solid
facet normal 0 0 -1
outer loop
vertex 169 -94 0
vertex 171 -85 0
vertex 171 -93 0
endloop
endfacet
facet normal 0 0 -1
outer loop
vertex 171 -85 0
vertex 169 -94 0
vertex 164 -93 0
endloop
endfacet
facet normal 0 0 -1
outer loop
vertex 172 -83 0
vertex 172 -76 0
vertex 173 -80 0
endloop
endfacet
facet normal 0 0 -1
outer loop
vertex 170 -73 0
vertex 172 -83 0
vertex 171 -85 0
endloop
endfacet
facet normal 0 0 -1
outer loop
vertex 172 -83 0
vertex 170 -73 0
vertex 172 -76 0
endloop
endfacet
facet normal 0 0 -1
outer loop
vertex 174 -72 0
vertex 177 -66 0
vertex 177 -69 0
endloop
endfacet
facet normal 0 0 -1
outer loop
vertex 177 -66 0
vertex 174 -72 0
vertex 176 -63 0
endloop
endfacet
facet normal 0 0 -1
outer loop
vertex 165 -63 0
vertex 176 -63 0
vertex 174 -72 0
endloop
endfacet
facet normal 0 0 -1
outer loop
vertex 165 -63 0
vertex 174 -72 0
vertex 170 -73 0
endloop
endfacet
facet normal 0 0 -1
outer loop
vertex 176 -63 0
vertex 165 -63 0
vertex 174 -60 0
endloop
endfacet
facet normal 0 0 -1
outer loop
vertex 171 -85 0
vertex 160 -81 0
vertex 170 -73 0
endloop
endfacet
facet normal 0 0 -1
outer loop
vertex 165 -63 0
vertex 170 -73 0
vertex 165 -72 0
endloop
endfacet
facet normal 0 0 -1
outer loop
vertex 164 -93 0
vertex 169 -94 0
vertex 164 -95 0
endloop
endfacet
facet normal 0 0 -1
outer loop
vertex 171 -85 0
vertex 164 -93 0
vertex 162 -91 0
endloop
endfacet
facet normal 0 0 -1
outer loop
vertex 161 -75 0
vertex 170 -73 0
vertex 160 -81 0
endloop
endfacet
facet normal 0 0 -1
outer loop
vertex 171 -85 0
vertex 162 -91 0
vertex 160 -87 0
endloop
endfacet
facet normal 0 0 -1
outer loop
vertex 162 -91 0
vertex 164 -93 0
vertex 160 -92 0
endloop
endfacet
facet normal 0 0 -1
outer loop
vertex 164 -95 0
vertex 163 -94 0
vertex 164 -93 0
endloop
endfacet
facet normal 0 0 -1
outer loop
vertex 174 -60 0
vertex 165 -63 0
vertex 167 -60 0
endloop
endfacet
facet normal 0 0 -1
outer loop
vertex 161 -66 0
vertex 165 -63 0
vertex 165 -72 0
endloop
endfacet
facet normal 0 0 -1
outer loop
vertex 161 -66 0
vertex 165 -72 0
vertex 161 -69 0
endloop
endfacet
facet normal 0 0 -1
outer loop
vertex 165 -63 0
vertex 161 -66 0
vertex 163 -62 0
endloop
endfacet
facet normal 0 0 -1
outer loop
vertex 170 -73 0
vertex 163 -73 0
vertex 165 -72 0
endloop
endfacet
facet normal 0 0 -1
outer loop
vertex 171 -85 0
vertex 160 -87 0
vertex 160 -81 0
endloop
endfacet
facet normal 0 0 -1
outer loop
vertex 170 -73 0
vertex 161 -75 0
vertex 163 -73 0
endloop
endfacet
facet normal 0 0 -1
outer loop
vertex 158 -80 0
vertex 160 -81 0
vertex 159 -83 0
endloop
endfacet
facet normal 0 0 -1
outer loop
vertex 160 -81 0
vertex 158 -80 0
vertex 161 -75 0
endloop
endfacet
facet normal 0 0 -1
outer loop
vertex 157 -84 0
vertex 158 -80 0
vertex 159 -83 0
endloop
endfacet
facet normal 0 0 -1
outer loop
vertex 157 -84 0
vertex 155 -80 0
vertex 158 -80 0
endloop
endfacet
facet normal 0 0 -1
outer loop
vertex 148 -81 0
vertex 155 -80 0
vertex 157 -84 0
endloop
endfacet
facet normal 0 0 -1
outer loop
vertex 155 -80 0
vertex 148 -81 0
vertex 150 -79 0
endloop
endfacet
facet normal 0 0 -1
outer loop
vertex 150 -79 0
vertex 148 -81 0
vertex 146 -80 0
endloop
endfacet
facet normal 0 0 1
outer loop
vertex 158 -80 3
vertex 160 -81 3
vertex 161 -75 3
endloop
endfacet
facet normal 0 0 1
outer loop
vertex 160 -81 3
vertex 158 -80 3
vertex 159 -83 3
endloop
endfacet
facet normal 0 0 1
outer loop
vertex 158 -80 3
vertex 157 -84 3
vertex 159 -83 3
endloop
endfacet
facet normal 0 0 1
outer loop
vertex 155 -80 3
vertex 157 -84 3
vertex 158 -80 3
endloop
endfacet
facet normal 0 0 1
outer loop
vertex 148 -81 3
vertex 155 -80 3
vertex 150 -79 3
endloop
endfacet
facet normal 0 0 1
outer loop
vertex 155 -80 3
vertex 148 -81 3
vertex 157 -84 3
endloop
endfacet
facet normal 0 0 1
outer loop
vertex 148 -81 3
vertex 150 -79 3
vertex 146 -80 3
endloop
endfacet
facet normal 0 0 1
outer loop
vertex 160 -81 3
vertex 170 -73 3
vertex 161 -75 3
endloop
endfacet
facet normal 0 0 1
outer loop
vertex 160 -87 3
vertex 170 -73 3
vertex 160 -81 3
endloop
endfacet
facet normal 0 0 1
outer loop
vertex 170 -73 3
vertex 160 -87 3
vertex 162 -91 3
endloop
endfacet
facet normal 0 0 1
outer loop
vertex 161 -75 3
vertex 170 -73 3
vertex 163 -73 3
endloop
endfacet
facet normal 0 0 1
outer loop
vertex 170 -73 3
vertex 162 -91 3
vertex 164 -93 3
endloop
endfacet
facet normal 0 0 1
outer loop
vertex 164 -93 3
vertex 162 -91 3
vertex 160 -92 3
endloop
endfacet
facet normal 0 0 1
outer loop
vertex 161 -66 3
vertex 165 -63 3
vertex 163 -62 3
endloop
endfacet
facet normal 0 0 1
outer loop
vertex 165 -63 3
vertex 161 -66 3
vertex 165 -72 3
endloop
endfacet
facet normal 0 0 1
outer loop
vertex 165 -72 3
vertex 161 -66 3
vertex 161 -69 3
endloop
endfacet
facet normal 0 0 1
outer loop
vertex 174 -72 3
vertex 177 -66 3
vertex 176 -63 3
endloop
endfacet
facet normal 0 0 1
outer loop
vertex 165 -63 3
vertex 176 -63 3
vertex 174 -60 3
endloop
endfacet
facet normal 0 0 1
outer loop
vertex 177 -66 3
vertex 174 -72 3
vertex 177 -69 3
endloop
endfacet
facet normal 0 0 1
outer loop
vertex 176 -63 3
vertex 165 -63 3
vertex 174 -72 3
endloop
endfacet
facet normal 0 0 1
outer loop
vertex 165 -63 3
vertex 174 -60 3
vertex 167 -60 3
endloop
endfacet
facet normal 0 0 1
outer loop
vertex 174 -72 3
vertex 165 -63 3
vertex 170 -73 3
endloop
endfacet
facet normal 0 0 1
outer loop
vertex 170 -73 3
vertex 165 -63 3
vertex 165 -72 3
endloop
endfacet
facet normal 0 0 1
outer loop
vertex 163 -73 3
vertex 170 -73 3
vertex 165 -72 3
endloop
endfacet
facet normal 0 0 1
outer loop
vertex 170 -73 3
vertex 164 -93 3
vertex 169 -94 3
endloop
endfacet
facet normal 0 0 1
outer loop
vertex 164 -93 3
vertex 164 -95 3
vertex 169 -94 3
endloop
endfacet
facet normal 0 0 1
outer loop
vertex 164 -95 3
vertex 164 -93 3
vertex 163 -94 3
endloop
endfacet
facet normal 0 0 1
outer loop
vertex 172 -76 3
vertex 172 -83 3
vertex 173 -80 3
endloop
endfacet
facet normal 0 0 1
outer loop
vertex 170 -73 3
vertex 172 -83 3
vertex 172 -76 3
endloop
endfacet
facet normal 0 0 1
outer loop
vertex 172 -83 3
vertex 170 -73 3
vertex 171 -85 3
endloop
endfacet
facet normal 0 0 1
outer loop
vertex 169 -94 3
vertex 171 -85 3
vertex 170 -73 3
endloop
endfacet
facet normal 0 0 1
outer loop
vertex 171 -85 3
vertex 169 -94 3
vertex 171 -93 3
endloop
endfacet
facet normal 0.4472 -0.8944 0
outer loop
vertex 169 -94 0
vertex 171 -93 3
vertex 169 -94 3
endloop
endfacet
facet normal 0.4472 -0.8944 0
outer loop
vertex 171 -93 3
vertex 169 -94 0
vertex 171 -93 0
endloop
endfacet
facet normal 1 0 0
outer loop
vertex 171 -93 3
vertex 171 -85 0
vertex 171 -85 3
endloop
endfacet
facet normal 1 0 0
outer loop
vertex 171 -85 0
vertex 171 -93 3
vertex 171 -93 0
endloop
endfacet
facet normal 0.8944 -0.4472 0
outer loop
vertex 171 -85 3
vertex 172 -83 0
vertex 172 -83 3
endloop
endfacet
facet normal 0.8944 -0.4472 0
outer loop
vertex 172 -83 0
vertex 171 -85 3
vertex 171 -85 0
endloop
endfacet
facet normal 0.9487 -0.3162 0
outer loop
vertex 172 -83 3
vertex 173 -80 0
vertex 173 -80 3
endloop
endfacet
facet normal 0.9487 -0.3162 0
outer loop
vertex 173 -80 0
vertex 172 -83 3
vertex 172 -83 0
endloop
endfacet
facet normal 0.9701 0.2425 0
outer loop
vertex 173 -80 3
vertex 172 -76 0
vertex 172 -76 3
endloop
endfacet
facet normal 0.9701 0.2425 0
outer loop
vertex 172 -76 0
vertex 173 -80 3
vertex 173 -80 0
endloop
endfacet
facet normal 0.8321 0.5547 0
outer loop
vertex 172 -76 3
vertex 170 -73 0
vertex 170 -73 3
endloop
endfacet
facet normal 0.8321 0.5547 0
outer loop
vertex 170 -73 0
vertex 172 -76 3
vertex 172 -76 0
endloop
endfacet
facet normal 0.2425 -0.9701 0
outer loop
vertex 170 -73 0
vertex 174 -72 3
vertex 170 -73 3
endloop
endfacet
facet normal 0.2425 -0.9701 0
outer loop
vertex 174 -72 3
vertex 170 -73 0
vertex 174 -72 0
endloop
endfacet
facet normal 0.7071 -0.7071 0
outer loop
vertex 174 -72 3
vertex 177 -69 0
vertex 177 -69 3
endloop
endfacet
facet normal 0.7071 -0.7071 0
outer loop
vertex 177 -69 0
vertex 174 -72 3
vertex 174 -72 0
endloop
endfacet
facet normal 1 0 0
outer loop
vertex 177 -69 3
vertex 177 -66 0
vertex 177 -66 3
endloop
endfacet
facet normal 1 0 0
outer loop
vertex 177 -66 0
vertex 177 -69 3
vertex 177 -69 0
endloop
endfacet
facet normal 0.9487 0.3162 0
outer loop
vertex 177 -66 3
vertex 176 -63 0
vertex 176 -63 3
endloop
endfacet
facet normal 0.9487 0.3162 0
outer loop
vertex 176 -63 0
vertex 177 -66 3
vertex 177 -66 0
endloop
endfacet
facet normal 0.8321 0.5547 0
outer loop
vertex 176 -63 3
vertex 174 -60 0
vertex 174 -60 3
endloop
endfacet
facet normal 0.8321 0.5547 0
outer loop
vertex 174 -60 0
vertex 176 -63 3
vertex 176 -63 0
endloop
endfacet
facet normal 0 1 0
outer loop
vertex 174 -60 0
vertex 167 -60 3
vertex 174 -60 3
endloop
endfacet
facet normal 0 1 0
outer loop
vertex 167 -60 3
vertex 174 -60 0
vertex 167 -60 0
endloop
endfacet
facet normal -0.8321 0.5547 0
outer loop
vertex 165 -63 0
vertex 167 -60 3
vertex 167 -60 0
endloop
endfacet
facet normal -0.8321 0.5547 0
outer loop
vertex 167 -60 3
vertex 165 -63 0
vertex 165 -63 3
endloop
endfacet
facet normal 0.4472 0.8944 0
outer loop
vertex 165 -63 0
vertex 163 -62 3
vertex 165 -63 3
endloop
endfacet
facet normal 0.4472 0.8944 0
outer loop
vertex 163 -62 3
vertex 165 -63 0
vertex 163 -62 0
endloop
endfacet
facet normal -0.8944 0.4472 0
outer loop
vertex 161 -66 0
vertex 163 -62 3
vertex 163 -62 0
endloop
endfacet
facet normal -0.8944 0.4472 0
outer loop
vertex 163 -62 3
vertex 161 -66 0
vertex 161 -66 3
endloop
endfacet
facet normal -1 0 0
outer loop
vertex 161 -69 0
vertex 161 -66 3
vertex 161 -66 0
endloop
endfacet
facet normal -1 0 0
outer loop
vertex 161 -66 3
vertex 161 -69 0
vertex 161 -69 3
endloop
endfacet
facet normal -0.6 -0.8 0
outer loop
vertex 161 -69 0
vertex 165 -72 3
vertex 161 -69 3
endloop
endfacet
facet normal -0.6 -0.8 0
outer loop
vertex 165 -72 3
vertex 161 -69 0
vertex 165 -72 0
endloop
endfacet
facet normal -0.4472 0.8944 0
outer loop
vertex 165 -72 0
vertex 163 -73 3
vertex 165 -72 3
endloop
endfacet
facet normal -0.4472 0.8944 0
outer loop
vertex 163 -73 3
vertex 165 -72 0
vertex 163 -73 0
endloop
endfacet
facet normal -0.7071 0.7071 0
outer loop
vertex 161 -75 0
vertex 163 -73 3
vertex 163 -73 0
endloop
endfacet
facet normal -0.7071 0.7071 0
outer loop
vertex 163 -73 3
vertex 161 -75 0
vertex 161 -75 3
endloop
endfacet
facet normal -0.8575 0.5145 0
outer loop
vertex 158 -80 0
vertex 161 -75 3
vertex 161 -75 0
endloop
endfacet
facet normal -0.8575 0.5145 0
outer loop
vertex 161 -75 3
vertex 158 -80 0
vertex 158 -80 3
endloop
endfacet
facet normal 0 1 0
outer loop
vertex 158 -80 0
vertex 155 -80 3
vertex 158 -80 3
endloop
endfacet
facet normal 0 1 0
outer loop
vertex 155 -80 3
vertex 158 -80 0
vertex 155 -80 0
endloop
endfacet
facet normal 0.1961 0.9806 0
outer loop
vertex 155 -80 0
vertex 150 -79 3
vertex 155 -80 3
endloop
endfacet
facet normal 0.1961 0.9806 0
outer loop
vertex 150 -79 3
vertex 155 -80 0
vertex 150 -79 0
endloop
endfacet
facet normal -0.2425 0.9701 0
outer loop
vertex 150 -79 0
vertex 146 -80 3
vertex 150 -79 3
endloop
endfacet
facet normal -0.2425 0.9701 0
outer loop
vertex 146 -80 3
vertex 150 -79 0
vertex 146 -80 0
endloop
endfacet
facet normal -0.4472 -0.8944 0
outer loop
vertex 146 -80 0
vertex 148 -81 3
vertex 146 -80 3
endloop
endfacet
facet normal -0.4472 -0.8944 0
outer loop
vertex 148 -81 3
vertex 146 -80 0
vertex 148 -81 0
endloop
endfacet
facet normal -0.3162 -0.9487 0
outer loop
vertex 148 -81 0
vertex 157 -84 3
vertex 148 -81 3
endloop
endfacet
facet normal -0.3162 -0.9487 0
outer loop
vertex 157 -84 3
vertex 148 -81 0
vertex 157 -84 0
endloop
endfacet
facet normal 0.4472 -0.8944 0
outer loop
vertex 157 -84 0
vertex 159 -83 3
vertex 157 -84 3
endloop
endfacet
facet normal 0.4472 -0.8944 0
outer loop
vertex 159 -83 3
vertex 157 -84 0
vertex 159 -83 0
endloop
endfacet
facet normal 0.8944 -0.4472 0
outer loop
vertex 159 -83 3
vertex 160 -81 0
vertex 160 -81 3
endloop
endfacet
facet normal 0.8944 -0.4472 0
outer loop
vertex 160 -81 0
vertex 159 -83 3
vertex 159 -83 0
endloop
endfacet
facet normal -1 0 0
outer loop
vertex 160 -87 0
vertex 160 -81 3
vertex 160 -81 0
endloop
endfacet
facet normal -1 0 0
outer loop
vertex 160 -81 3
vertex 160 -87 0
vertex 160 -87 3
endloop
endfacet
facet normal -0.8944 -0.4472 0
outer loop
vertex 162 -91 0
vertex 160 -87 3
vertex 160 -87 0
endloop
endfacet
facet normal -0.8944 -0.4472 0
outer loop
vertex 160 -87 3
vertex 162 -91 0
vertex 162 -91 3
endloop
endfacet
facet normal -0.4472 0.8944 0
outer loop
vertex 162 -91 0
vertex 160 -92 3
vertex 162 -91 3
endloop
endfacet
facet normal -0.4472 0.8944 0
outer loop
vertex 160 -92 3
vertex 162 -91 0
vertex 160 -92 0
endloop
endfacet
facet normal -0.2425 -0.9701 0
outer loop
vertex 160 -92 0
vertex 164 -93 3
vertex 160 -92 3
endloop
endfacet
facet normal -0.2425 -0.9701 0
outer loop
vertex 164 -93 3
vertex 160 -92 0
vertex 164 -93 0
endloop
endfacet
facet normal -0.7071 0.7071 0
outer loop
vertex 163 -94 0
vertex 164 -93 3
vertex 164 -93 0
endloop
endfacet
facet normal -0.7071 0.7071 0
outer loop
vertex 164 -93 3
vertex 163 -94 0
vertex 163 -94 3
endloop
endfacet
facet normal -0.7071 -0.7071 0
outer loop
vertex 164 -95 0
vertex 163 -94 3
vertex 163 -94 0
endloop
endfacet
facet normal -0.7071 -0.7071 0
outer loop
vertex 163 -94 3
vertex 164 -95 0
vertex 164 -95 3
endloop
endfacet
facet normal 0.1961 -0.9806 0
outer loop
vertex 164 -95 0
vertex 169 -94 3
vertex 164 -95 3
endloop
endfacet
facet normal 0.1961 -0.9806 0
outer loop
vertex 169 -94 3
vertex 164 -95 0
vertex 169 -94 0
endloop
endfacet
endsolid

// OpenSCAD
//start
module  child() 
{ 
color  ([0,0.6,0]) 
{ 
            polygon(points = [
[161.00,-66.00]
,[162.00,-64.00]
,[163.00,-62.00]
,[165.00,-63.00]
,[167.00,-60.00]
,[170.00,-60.00]
,[174.00,-60.00]
,[176.00,-63.00]
,[177.00,-66.00]
,[177.00,-69.00]
,[174.00,-72.00]
,[170.00,-73.00]
,[172.00,-76.00]
,[173.00,-80.00]
,[172.00,-83.00]
,[171.00,-85.00]
,[171.00,-89.00]
,[171.00,-93.00]
,[169.00,-94.00]
,[164.00,-95.00]
,[163.00,-94.00]
,[164.00,-93.00]
,[160.00,-92.00]
,[162.00,-91.00]
,[160.00,-87.00]
,[160.00,-81.00]
,[159.00,-83.00]
,[157.00,-84.00]
,[154.00,-83.00]
,[148.00,-81.00]
,[146.00,-80.00]
,[150.00,-79.00]
,[155.00,-80.00]
,[158.00,-80.00]
,[161.00,-75.00]
,[163.00,-73.00]
,[165.00,-72.00]
,[161.00,-69.00]
]
,paths = [
[0,1,2,3,4,5,6,7,8,9,10,11,12,13,14,15,16,17,18,19,20,21,22,23,24,25,26,27,28,29,30,31,32,33,34,35,36,37]]
            );
}
}
//start
module  background() 
{ 
color  ([1,0.3411764705882353,0.22745098039215686]) 
{ 
            polygon(points = [
[111.00,-49.00]
,[112.00,-65.00]
,[112.00,-77.00]
,[112.00,-88.00]
,[111.00,-93.00]
,[113.00,-93.00]
,[114.00,-89.00]
,[115.00,-83.00]
,[114.00,-56.00]
,[113.00,-47.00]
,[108.00,-41.00]
,[110.00,-41.00]
,[113.00,-38.00]
,[119.00,-38.00]
,[122.00,-39.00]
,[124.00,-39.00]
,[125.00,-59.00]
,[125.00,-69.00]
,[125.00,-77.00]
,[126.00,-83.00]
,[127.00,-90.00]
,[127.00,-94.00]
,[128.00,-94.00]
,[129.00,-90.00]
,[127.00,-74.00]
,[127.00,-59.00]
,[126.00,-39.00]
,[131.00,-41.00]
,[134.00,-41.00]
,[137.00,-42.00]
,[140.00,-41.00]
,[141.00,-38.00]
,[144.00,-38.00]
,[148.00,-37.00]
,[150.00,-34.00]
,[153.00,-26.00]
,[152.00,-25.00]
,[157.00,-19.00]
,[156.00,-15.00]
,[152.00,-10.00]
,[150.00,-10.00]
,[151.00,-6.00]
,[149.00,0.00]
,[144.00,1.00]
,[142.00,5.00]
,[137.00,8.00]
,[132.00,7.00]
,[129.00,6.00]
,[127.00,9.00]
,[122.00,10.00]
,[117.00,10.00]
,[113.00,8.00]
,[111.00,7.00]
,[104.00,9.00]
,[99.00,6.00]
,[98.00,4.00]
,[92.00,4.00]
,[88.00,1.00]
,[87.00,-3.00]
,[88.00,-5.00]
,[84.00,-9.00]
,[84.00,-12.00]
,[84.00,-14.00]
,[81.00,-17.00]
,[79.00,-22.00]
,[79.00,-25.00]
,[80.00,-28.00]
,[80.00,-32.00]
,[83.00,-35.00]
,[85.00,-37.00]
,[86.00,-39.00]
,[89.00,-39.00]
,[93.00,-40.00]
,[93.00,-42.00]
,[96.00,-45.00]
,[100.00,-44.00]
,[100.00,-43.00]
,[105.00,-42.00]
,[108.00,-41.00]
,[105.00,-42.00]
,[103.00,-91.00]
,[103.00,-95.00]
,[106.00,-96.00]
,[105.00,-91.00]
,[107.00,-89.00]
,[107.00,-95.00]
,[110.00,-95.00]
,[110.00,-89.00]
,[117.00,-92.00]
,[115.00,-95.00]
,[114.00,-92.00]
,[116.00,-90.00]
,[120.00,-88.00]
,[119.00,-95.00]
,[117.00,-95.00]
,[117.00,-88.00]
,[120.00,-92.00]
,[120.00,-94.00]
,[122.00,-94.00]
,[122.00,-92.00]
,[121.00,-92.00]
,[134.00,-91.00]
,[134.00,-95.00]
,[136.00,-95.00]
,[136.00,-91.00]
,[131.00,-91.00]
,[132.00,-95.00]
,[130.00,-95.00]
,[125.00,-90.00]
,[125.00,-95.00]
,[124.00,-93.00]
,[123.00,-89.00]
,[70.00,-76.00]
,[70.00,-74.00]
,[83.00,-73.00]
,[113.00,-74.00]
,[114.00,-77.00]
,[71.00,-76.00]
,[185.00,-76.00]
,[185.00,-74.00]
,[173.00,-74.00]
,[130.00,-74.00]
,[127.00,-72.00]
,[127.00,-76.00]
,[155.00,-76.00]
,[170.00,-9.00]
,[172.00,-15.00]
,[176.00,-16.00]
,[180.00,-15.00]
,[177.00,-9.00]
,[176.00,-2.00]
,[172.00,-3.00]
]
,paths = [
[0,1,2,3,4,5,6,7,8,9,10,11,12,13,14,15,16,17,18,19,20,21,22,23,24,25,26,27,28,29,30,31,32,33,34,35,36,37,38,39,40,41,42,43,44,45,46,47,48,49,50,51,52,53,54,55,56,57,58,59,60,61,62,63,64,65,66,67,68,69,70,71,72,73,74,75,76,77,78,79],[80,81,82,83],[84,85,86,87],[88,89,90,91],[92,93,94,95],[96,97,98,99,100],[101,102,103,104],[105,106,107],[108,109,110,111],[112,113,114,115,116,117],[118,119,120,121,122,123,124],[125,126,127,128,129,130,131]]
            );
}
}

linear_extrude(height = 3){
translate([0, 0, 7]) child();
}
linear_extrude(height = 2){
background();
}
